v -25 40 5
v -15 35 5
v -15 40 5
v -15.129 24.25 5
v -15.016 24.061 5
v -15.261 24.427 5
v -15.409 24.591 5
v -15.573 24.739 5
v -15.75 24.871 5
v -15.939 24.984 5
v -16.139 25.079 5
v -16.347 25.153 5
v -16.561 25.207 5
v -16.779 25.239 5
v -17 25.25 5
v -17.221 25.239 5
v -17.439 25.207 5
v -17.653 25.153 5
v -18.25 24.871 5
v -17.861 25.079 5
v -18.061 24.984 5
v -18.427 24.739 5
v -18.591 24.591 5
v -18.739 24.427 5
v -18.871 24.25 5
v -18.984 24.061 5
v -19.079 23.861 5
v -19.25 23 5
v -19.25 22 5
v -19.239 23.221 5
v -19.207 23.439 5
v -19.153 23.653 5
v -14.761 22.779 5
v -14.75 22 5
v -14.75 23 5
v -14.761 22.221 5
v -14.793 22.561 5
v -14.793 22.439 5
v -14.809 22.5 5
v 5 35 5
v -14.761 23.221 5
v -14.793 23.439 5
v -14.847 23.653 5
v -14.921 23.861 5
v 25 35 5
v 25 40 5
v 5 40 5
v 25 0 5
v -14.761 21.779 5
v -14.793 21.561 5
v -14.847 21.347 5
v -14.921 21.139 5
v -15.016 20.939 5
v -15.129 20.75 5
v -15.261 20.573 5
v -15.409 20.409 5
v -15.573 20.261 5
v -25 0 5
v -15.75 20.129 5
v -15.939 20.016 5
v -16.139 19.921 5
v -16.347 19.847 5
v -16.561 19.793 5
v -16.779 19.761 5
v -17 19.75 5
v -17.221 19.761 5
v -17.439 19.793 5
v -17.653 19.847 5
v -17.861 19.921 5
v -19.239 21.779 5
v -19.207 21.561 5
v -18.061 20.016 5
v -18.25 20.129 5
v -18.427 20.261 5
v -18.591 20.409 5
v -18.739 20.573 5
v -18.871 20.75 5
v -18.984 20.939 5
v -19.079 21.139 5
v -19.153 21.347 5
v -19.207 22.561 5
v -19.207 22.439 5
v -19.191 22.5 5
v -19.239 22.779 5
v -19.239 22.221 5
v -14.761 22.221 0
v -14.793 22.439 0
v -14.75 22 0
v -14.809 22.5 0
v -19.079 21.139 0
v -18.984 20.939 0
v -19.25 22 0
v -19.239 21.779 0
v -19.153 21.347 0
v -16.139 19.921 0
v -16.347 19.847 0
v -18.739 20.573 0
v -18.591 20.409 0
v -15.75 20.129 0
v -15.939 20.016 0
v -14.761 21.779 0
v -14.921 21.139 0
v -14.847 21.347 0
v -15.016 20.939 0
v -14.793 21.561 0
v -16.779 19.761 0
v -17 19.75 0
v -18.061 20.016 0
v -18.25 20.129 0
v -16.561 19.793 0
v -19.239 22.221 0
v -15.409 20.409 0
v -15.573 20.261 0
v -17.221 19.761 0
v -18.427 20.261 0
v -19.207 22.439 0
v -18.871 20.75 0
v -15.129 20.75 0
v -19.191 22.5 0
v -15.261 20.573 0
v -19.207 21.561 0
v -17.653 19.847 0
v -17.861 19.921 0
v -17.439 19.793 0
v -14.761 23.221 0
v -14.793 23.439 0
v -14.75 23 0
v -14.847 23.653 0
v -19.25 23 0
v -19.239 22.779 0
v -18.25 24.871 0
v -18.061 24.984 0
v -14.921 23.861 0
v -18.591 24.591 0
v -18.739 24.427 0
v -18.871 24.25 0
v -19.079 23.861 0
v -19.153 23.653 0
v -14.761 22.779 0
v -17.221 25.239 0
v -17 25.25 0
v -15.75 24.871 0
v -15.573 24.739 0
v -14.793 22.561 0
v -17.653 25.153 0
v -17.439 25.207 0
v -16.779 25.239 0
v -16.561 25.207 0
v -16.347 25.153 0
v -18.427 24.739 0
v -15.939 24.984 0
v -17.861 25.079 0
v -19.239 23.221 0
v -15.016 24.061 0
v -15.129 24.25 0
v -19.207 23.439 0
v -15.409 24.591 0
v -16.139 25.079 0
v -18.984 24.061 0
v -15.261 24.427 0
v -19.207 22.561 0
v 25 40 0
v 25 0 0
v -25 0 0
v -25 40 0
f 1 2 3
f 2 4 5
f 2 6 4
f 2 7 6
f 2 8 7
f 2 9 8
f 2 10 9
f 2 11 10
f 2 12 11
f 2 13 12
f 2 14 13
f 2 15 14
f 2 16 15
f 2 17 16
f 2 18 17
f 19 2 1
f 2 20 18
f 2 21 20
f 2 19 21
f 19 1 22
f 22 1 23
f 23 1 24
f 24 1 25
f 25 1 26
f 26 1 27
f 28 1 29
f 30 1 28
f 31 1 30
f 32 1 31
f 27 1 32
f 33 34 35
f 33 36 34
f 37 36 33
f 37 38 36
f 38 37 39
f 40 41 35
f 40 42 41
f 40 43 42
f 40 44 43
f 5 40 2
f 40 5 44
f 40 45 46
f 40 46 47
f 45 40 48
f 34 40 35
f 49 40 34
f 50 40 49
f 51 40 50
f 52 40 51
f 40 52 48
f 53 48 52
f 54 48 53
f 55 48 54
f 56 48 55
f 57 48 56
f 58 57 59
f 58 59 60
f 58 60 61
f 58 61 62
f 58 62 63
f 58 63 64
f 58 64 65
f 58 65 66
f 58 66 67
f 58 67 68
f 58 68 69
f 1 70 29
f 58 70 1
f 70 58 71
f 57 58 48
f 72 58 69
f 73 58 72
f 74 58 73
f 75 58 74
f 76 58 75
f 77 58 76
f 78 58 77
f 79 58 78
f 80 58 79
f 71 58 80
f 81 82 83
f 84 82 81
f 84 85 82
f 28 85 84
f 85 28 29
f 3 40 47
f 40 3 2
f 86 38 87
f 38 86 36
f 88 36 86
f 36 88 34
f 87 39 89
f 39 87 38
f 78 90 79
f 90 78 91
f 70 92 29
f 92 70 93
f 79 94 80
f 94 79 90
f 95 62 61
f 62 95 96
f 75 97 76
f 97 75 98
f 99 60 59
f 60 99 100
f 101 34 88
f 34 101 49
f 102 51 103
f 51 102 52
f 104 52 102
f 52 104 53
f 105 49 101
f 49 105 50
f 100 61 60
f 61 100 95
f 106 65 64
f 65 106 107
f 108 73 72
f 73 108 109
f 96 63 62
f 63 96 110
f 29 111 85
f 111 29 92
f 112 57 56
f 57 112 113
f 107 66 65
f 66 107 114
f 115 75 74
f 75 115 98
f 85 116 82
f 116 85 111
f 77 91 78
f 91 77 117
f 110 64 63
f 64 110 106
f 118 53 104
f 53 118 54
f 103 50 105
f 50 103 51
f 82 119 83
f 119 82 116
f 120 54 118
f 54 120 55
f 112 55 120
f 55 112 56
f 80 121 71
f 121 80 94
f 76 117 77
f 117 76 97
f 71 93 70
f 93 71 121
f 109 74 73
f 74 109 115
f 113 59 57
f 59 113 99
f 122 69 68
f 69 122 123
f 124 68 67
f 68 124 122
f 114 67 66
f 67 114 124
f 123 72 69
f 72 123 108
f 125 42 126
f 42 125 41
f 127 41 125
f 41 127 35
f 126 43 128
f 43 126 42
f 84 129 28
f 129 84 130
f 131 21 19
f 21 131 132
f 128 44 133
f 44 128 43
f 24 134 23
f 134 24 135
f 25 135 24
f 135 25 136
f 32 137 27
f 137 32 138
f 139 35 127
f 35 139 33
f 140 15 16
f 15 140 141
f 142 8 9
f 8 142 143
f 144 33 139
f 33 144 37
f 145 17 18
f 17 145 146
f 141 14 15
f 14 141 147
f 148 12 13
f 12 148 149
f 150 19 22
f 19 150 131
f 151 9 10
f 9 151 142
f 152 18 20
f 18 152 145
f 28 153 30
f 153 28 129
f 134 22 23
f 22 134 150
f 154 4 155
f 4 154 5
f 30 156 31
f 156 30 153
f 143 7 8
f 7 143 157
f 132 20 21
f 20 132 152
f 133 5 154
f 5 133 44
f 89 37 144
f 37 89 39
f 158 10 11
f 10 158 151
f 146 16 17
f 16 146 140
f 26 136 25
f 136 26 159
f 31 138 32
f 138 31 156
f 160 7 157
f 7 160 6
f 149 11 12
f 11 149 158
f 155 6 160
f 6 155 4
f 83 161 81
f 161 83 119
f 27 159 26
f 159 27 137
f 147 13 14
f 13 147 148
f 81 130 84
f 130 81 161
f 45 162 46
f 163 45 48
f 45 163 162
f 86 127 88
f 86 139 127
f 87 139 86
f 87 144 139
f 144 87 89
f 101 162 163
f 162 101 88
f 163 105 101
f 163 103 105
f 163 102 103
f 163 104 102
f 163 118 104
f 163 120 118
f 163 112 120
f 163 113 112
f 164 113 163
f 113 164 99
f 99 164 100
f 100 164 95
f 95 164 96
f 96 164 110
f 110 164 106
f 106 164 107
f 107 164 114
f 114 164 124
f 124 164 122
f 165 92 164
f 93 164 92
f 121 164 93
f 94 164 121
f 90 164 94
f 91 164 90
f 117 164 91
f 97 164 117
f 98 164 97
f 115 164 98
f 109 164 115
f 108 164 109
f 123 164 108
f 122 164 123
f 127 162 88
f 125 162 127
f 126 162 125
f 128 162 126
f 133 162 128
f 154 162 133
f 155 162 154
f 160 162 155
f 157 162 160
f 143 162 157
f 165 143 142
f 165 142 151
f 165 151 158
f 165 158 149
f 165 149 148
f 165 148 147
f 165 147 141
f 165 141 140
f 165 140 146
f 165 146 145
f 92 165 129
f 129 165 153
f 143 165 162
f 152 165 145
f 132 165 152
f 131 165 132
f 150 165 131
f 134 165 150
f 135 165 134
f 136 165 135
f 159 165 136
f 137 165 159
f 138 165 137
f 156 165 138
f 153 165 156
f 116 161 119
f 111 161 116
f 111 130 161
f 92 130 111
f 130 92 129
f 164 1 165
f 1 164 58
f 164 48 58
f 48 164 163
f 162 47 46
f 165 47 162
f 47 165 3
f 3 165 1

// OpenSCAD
// L-shaped mounting bracket for a NEMA 17 stepper motor (e.g., syringe pump)
// Print orientation: base plate lies on the bed (z = 0), motor plate builds upward.

// ---------------- Parameters ----------------
base_x      = 25;    // base plate half-width (X: -25 .. 25)
base_y      = 45;    // base plate length (Y: 0 .. 45)
base_t      = 5;     // base plate thickness (Z: 0 .. 5)

motor_h     = 50;    // motor plate height (Z: 0 .. 50)
motor_w     = 5;     // motor plate thickness (Y: 0 .. 5)

boss_d      = 23;    // motor centring boss hole diameter
boss_x      = 0;     // boss hole centre X
boss_z      = 28;    // boss hole centre Z

screw_d     = 3.4;   // M3 screw hole diameter
screw_p     = 31;    // square pattern side length
screw_n     = 4;     // number of screw holes

gusset_t    = 5;     // gusset thickness (X)
gusset_r    = 20;    // gusset leg along +Y
gusset_z    = 20;    // gusset leg along +Z

eps         = 0.5;   // cutter overshoot past faces

$fn = 96;            // curve resolution

// ---------------- Model ----------------
difference() {
    // Base plate
    translate([-base_x, 0, 0])
        cube([base_x * 2, base_y, base_t]);

    // Motor plate (standing on the back edge of the base)
    translate([-base_x, base_y - motor_w, 0])
        cube([base_x * 2, motor_w, motor_h]);

    // Triangular gussets, flush with the left and right edges
    for (sx = [-1, 1])
        translate([sx * (base_x - gusset_t), base_y - motor_w, 0])
            rotate([90, 0, 0])
                linear_extrude(height = gusset_t)
                    polygon(points = [
                        [motor_w, base_t],
                        [motor_w + gusset_r, base_t],
                        [motor_w, base_t + gusset_z]
                    ]);

    // Base plate through-holes (M4)
    for (h = [base_y / 2 - eps, base_y / 2 + eps])
        translate([-17, h, -eps])
            cylinder(d = 4.5, h = base_t + 2 * eps, $fn = 64);

    // Motor boss hole (cut along Y)
    translate([boss_x, base_y - motor_w - eps, boss_z])
        rotate([0, 90, 0])
            cylinder(d = boss_d, h = motor_w + 2 * eps, $fn = 96);

    // M3 screw holes on a square pattern centred on the boss hole
    for (i = [0 : screw_n - 1]) {
        a = i * 90;
        translate([boss_x + (i < 2 ? -1 : 1) * screw_p / 2,
                   base_y - motor_w - eps,
                   boss_z + (i >= 2 ? -1 : 1) * screw_p / 2])
            rotate([0, 90, a])
                cylinder(d = screw_d, h = motor_w + 2 * eps, $fn = 64);
    }
}
